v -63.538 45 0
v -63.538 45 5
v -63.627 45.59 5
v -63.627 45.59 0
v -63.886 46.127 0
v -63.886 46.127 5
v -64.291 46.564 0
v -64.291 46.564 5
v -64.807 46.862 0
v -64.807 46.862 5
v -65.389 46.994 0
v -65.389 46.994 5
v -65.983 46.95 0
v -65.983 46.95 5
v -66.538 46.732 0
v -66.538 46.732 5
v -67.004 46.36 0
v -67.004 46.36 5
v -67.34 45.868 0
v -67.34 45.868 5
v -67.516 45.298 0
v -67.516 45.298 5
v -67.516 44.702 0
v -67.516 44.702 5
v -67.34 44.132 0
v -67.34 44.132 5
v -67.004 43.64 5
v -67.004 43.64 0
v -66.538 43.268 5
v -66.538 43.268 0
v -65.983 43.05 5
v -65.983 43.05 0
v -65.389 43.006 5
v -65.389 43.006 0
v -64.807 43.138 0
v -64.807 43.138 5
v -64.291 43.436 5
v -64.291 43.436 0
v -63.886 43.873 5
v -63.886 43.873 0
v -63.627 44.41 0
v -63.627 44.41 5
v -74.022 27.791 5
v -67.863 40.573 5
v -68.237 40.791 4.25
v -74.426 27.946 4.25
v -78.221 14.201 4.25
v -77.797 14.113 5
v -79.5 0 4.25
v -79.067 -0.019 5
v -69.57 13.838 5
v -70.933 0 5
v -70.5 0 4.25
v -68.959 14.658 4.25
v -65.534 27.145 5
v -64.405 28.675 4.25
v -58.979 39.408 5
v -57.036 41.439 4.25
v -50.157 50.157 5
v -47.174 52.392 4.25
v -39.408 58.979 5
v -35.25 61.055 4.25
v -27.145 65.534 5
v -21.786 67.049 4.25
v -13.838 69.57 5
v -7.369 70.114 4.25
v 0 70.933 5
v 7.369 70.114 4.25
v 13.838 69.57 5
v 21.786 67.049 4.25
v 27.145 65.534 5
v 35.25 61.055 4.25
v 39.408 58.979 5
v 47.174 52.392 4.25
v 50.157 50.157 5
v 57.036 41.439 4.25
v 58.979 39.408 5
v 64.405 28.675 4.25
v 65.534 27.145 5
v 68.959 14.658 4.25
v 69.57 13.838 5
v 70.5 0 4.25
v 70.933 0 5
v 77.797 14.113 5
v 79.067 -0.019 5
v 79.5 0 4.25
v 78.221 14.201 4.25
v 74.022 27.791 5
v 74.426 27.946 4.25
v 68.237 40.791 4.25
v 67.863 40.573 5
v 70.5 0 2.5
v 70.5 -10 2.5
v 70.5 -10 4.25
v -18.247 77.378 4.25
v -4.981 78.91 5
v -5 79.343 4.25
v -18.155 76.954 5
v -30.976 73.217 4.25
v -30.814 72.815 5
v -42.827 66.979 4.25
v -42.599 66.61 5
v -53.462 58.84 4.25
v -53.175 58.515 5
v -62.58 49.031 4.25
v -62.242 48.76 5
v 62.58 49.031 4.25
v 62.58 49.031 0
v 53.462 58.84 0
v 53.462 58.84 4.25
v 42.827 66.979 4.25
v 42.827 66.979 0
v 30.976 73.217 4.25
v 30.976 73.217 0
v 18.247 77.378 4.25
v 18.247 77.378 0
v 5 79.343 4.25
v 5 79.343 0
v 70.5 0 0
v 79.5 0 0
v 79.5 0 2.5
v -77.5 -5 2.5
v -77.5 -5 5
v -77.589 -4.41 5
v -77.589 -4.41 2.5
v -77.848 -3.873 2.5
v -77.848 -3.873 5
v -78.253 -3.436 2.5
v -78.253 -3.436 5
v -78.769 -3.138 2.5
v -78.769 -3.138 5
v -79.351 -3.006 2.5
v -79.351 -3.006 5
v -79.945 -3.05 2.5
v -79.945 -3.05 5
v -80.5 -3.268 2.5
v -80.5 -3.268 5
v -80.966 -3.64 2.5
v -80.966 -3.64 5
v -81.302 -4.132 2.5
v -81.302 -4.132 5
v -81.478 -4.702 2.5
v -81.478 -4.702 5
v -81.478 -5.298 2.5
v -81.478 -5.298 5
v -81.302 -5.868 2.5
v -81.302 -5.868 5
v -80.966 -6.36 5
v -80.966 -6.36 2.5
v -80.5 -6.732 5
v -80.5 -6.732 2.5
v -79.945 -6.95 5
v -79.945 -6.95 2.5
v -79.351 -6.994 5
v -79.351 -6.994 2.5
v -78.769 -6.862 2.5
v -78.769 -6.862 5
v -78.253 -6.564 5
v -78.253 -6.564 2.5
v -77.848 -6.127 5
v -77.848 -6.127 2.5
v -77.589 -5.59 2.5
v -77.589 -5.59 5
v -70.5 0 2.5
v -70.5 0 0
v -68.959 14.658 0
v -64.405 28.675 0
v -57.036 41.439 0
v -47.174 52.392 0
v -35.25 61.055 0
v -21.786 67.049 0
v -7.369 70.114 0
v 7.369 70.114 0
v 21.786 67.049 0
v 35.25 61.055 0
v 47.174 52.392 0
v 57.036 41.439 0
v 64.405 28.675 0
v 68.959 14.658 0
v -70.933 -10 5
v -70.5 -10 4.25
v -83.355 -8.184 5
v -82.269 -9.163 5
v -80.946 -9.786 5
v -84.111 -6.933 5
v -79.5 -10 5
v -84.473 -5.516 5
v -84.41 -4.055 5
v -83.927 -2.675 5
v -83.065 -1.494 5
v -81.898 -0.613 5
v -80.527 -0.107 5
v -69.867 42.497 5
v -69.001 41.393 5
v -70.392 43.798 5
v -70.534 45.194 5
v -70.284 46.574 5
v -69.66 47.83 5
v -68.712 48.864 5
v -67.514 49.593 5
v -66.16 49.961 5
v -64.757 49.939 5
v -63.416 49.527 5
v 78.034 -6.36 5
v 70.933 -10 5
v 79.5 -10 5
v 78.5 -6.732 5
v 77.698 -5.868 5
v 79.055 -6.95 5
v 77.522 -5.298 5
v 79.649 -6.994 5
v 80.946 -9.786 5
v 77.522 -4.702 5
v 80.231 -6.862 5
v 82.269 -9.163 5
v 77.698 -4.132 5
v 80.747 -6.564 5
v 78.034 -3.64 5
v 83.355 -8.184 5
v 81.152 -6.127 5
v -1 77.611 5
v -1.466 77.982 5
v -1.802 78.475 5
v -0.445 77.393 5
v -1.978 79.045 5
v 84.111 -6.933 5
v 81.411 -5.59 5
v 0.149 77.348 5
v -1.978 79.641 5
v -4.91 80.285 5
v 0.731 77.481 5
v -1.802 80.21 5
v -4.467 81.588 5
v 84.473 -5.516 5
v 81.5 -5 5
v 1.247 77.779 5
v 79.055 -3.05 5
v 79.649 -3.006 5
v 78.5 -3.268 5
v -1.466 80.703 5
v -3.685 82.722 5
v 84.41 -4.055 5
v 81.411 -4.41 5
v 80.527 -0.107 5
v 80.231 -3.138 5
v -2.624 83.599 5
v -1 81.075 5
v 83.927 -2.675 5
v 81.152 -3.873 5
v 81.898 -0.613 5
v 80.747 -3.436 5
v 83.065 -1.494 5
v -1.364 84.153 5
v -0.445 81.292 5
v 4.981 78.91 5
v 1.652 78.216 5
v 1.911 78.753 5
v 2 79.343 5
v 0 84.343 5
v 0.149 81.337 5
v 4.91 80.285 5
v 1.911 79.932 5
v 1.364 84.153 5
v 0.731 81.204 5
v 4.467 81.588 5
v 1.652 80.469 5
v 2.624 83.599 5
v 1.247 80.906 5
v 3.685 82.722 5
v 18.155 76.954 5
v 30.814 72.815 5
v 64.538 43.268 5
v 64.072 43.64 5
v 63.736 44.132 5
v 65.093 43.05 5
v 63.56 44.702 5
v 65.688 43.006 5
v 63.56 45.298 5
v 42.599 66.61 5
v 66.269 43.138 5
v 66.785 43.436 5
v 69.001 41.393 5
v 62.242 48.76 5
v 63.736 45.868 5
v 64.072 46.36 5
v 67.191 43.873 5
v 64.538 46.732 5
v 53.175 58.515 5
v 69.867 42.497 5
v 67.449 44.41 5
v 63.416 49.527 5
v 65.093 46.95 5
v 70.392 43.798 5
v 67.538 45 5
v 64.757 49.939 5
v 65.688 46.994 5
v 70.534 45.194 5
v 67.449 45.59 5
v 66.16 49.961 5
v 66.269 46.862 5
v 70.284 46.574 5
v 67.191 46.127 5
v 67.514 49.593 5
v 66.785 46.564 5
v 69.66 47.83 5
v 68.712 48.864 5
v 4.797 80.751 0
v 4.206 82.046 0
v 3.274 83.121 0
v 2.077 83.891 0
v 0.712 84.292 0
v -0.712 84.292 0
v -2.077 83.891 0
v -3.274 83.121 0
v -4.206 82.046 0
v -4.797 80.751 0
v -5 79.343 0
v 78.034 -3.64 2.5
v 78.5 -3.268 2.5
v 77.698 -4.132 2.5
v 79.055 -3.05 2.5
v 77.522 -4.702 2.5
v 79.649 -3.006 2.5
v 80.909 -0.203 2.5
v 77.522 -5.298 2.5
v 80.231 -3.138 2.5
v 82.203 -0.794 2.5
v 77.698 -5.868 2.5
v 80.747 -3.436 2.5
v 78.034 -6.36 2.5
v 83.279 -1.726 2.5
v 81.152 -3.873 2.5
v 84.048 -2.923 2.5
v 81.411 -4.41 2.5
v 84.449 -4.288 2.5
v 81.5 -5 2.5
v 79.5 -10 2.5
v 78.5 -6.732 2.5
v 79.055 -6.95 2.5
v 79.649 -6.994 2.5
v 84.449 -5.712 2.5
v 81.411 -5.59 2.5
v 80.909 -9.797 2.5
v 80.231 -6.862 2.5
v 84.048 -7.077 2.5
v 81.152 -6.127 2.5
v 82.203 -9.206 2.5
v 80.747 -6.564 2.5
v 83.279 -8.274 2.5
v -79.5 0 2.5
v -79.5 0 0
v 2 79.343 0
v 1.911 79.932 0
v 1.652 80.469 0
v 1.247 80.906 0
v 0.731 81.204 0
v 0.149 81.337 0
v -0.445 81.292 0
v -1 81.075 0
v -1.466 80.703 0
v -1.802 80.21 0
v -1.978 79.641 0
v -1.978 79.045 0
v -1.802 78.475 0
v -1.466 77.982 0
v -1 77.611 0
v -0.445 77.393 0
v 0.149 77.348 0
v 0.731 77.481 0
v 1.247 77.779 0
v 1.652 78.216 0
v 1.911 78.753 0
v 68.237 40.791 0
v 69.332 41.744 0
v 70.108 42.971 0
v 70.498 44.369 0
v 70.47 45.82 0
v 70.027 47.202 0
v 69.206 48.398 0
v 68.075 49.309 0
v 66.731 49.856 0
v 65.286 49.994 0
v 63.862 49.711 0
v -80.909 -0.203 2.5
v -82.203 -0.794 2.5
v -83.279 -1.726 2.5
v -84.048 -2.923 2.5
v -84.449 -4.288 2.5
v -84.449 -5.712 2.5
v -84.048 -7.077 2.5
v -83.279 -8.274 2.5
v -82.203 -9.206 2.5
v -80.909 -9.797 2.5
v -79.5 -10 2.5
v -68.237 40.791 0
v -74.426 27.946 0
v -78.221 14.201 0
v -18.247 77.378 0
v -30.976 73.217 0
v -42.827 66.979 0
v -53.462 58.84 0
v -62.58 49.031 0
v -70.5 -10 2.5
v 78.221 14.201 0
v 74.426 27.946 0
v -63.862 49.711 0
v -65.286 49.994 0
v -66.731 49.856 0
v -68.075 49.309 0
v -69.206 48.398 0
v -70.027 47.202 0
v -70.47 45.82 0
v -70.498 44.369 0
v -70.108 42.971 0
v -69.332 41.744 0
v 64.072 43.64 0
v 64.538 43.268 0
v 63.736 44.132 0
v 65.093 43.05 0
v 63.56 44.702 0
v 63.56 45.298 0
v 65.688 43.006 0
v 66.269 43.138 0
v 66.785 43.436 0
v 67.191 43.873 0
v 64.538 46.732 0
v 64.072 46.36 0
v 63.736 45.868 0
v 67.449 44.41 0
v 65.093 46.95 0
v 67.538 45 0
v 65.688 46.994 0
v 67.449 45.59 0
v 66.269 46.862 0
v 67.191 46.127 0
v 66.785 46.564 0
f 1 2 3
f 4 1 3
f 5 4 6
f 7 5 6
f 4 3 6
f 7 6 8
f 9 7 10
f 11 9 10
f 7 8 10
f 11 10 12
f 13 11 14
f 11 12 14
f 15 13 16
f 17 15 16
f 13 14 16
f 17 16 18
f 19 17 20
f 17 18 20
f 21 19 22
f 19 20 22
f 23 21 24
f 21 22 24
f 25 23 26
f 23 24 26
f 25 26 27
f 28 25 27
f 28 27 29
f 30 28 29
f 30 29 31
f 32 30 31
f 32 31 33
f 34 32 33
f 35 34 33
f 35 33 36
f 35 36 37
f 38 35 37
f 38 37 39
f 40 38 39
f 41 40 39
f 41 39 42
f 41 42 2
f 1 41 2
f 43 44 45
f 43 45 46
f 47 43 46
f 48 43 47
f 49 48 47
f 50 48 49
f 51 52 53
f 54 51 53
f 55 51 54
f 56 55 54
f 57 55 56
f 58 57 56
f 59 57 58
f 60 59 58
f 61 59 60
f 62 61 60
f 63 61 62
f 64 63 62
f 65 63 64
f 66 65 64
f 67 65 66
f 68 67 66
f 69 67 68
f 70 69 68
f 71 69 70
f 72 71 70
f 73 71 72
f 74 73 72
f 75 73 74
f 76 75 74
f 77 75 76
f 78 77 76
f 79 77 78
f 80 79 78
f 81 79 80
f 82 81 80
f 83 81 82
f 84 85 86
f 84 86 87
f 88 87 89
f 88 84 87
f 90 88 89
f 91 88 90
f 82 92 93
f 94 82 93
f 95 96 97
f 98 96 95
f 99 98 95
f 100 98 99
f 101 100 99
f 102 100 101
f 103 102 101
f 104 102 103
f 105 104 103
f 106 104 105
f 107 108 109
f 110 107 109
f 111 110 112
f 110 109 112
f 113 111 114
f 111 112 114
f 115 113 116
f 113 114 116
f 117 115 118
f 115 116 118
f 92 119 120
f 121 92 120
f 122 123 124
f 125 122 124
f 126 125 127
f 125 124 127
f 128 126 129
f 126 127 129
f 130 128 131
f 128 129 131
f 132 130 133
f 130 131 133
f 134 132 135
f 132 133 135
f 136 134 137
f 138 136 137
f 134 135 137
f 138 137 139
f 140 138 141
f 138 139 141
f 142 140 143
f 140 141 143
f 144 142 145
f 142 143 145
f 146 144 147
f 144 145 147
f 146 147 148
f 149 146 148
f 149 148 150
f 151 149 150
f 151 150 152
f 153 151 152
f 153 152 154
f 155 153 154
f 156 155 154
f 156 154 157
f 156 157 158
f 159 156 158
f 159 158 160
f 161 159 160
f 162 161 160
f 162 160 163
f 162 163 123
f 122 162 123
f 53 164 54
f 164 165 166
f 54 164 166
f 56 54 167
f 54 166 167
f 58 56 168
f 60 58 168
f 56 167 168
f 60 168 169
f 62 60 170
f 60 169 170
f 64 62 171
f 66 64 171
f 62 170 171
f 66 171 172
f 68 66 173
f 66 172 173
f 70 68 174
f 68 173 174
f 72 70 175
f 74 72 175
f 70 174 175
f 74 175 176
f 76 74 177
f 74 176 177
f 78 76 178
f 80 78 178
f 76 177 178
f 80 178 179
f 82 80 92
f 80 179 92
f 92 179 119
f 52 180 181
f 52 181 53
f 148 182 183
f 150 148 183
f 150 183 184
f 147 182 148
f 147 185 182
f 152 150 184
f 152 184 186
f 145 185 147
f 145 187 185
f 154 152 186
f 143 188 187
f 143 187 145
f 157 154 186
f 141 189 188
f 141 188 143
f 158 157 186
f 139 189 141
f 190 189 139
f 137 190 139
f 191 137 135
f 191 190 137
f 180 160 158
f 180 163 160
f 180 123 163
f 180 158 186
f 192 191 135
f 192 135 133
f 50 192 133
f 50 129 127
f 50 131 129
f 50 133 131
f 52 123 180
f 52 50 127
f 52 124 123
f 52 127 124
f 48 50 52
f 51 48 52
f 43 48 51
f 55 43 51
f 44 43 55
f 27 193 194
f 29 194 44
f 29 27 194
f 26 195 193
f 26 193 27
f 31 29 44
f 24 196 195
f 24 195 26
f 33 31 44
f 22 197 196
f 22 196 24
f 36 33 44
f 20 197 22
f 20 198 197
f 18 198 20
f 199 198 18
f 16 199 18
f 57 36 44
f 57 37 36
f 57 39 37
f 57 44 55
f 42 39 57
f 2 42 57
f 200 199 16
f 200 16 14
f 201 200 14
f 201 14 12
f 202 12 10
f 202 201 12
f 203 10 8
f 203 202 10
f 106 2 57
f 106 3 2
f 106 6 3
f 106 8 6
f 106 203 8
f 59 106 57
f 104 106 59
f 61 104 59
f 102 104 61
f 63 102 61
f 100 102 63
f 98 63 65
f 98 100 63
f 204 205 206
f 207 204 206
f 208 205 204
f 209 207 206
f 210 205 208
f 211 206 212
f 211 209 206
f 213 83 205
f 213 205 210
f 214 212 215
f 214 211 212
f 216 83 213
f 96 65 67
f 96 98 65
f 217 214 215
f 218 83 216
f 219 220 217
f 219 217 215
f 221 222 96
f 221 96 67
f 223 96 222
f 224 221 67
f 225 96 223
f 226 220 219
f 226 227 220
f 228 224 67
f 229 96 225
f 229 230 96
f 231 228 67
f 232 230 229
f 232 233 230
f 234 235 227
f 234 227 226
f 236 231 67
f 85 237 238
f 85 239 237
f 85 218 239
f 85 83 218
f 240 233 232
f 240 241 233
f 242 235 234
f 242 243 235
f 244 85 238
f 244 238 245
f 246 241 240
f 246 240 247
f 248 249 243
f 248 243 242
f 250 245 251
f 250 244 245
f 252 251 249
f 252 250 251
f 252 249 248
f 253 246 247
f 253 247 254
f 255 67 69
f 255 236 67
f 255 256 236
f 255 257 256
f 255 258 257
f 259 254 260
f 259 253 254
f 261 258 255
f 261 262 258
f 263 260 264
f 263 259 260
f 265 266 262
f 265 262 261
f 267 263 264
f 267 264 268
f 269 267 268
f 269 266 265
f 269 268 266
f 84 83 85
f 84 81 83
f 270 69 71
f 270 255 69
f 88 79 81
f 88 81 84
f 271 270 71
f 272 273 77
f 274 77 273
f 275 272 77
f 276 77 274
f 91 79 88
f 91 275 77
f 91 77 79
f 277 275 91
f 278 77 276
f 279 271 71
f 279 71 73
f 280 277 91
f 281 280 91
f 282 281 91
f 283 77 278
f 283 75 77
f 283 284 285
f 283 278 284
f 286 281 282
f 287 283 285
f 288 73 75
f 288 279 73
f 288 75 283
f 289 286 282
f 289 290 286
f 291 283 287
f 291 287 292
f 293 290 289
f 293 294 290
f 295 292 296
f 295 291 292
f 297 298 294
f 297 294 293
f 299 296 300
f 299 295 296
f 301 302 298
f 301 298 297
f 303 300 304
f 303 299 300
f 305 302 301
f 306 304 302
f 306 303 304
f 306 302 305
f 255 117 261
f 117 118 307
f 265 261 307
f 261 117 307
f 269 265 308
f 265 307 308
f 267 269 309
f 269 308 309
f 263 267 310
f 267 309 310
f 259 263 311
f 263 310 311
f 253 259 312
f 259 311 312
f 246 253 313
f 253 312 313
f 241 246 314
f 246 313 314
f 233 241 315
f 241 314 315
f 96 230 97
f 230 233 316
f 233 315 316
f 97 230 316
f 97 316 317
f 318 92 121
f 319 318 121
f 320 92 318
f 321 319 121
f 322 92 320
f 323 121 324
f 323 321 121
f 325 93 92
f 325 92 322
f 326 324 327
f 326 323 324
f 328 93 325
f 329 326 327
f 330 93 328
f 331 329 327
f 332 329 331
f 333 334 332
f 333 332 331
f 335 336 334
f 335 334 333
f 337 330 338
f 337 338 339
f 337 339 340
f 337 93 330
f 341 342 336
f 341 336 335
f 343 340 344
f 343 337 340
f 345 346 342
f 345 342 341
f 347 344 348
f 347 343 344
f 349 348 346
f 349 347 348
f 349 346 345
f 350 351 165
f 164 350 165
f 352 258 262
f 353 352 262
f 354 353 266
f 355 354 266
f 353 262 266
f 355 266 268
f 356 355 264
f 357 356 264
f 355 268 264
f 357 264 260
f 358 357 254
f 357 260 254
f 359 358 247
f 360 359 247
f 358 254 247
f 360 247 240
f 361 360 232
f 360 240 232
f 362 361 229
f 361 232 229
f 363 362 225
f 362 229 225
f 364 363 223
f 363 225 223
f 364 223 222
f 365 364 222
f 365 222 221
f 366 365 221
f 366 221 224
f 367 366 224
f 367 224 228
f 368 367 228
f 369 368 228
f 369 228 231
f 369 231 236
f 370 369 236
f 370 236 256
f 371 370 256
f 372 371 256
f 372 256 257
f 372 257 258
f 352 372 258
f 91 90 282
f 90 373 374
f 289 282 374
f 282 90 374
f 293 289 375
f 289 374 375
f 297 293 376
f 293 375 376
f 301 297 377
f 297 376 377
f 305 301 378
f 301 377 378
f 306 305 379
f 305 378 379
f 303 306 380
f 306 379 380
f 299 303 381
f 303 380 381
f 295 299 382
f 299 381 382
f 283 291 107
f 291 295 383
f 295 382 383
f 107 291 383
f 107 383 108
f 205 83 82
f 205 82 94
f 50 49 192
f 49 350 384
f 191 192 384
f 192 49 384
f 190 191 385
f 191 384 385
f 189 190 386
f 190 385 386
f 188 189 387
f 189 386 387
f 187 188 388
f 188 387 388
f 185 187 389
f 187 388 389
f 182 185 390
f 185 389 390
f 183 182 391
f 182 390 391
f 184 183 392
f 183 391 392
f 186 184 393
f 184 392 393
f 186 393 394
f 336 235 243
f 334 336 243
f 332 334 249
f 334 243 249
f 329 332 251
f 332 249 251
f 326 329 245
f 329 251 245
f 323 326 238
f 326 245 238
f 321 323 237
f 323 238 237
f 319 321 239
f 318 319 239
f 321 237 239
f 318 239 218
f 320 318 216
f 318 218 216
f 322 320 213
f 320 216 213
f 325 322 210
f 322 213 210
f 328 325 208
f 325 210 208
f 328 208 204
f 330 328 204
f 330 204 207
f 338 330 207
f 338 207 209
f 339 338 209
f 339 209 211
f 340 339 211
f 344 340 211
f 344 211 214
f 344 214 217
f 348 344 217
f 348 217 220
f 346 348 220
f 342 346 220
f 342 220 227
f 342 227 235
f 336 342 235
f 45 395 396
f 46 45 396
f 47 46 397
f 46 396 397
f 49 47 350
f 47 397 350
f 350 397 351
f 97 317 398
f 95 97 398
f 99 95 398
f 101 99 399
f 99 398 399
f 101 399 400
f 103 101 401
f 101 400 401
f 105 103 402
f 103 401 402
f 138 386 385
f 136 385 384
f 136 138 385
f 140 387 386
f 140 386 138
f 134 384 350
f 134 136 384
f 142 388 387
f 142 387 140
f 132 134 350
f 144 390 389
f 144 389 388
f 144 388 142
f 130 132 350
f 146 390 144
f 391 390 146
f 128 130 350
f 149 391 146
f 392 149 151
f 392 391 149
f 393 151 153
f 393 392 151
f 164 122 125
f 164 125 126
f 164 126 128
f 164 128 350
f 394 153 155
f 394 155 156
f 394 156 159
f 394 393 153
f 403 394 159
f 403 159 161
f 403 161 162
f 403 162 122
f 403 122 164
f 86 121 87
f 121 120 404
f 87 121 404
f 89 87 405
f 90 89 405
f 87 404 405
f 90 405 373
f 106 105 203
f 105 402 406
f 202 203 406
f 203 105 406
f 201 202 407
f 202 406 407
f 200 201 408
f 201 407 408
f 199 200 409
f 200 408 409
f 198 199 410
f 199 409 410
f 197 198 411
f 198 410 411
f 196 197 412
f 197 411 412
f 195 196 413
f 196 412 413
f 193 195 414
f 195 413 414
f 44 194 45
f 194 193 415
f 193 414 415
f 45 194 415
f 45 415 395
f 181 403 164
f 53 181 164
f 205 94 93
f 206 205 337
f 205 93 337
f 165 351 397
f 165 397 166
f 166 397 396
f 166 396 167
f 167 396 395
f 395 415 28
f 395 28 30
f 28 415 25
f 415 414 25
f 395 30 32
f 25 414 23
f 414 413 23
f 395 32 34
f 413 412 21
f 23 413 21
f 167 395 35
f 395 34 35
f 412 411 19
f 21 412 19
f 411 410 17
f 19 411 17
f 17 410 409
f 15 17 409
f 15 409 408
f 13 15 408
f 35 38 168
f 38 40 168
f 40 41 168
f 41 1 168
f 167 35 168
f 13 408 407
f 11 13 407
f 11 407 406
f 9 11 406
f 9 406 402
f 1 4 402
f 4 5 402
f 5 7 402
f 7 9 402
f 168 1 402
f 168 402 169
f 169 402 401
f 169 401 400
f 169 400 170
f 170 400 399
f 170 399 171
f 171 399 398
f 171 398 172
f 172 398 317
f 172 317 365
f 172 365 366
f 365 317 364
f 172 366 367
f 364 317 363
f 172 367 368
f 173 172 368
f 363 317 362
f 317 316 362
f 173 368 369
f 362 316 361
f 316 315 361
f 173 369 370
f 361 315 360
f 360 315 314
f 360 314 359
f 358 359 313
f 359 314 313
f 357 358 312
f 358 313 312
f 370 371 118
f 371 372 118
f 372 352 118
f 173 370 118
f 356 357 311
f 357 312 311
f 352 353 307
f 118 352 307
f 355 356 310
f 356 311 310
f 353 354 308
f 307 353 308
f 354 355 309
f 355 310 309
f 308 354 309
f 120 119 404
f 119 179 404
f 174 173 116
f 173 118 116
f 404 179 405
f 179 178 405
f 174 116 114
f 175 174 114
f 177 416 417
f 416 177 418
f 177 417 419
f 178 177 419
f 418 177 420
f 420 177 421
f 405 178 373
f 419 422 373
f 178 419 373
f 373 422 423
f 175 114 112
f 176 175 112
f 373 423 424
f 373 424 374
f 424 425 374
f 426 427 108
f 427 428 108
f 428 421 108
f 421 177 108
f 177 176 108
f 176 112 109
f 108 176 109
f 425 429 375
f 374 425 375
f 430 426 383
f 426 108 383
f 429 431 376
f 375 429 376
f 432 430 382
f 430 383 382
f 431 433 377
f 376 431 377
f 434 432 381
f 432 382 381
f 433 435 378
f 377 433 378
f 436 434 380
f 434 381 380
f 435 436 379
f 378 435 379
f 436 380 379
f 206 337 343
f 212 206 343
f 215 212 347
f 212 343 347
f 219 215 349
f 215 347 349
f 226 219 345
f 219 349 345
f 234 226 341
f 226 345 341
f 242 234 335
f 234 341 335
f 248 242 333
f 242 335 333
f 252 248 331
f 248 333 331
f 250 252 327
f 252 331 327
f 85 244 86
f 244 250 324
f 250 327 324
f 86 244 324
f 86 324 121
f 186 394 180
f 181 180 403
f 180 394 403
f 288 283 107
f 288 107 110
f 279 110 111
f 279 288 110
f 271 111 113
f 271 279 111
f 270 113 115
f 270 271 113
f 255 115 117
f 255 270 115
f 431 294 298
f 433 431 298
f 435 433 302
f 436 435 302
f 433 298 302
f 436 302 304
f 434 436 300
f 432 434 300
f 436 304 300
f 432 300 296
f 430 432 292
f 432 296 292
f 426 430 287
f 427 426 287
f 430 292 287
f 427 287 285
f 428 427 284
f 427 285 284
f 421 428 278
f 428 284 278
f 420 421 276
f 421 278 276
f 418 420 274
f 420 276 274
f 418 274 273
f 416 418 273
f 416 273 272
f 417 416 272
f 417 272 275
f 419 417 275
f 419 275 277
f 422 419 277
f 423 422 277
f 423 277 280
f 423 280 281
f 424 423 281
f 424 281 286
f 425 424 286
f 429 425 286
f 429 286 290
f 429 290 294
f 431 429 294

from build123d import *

# Parameters (mm, degrees)
F1_DEPTH   = 5
F2_R       = 2
F3_DEPTH   = 25
F4_SIZE2   = 0.4330127019
F4_SIZE    = 0.75
F4_2_SIZE2 = 0.4330127019
F4_2_SIZE  = 0.75
F4_3_SIZE2 = 0.4330127019
F4_3_SIZE  = 0.75
F4_4_SIZE2 = 0.4330127019
F4_4_SIZE  = 0.75
F4_5_SIZE2 = 0.4330127019
F4_5_SIZE  = 0.75
F6_DEPTH   = 2.5


with BuildPart() as f1:
    # F0 (on Top) → F1 (new body)
    with BuildSketch(Plane.XY):
        with BuildLine():
            Line((79.5, -10), (79.5, 0))
            ThreePointArc((79.5, 0), (76.6326218032, 21.1587163024), (68.2373264008, 40.7911422452))
            ThreePointArc((68.2373264008, 40.7911422452), (65.5381568249, 45), (62.5797484655, 49.0308584668))
            ThreePointArc((62.5797484655, 49.0308584668), (37.0331769321, 70.3476638298), (5, 79.3426115023))
            ThreePointArc((5, 79.3426115023), (0, 79.5), (-5, 79.3426115023))
            ThreePointArc((-5, 79.3426115023), (-37.0331769321, 70.3476638298), (-62.5797484655, 49.0308584668))
            ThreePointArc((-62.5797484655, 49.0308584668), (-65.5381568249, 45), (-68.2373264008, 40.7911422452))
            ThreePointArc((-68.2373264008, 40.7911422452), (-76.6326218032, 21.1587163024), (-79.5, 0))
            Line((-79.5, 0), (-79.5, -10))
            Line((-79.5, -10), (-70.5, -10))
            Line((-70.5, -10), (-70.5, 0))
            ThreePointArc((-70.5, 0), (0, 70.5), (70.5, 0))
            Line((70.5, 0), (70.5, -10))
            Line((70.5, -10), (79.5, -10))
        make_face()
        with BuildLine():
            ThreePointArc((79.5, -10), (84.5, -5), (79.5, 0))
            Line((79.5, 0), (79.5, -10))
        make_face()
        with BuildLine():
            ThreePointArc((62.5797484655, 49.0308584668), (65.5381568249, 45), (68.2373264008, 40.7911422452))
            ThreePointArc((68.2373264008, 40.7911422452), (69.6600534805, 47.8301886792), (62.5797484655, 49.0308584668))
        make_face()
        with BuildLine():
            ThreePointArc((-5, 79.3426115023), (0, 79.5), (5, 79.3426115023))
            ThreePointArc((5, 79.3426115023), (0, 84.3426115023), (-5, 79.3426115023))
        make_face()
        with BuildLine():
            ThreePointArc((-68.2373264008, 40.7911422452), (-65.5381568249, 45), (-62.5797484655, 49.0308584668))
            ThreePointArc((-62.5797484655, 49.0308584668), (-69.6600534805, 47.8301886792), (-68.2373264008, 40.7911422452))
        make_face()
        with BuildLine():
            ThreePointArc((-79.5, 0), (-84.5, -5), (-79.5, -10))
            Line((-79.5, -10), (-79.5, 0))
        make_face()
    extrude(amount=F1_DEPTH)

    # F2 (on face) → F3 (cut)
    with BuildSketch(Plane.XY.offset(5)):
        with Locations((0, 79.3426115023)):
            Circle(F2_R)
        with Locations((-65.5381568249, 45)):
            Circle(F2_R)
        with Locations((65.5381568249, 45)):
            Circle(F2_R)
        with Locations((-79.5, -5)):
            Circle(F2_R)
        with Locations((79.5, -5)):
            Circle(F2_R)
    extrude(amount=-F3_DEPTH, mode=Mode.SUBTRACT)

    # F4
    f4_edges = [f1.edges().sort_by_distance(p)[0] for p in [
        (0, 70.5, 5),
    ]]
    f4_side = f1.faces().sort_by_distance((0, 70.5, 2.5))[0]
    chamfer(f4_edges, length=F4_SIZE, length2=F4_SIZE2, reference=f4_side)

    # F4#2
    f4_2_edges = [f1.edges().sort_by_distance(p)[0] for p in [
        (-37.033177, 70.347664, 5),
    ]]
    f4_2_side = f1.faces().sort_by_distance((-37.033177, 70.347664, 2.5))[0]
    chamfer(f4_2_edges, length=F4_2_SIZE, length2=F4_2_SIZE2, reference=f4_2_side)

    # F4#3
    f4_3_edges = [f1.edges().sort_by_distance(p)[0] for p in [
        (37.033177, 70.347664, 5),
    ]]
    f4_3_side = f1.faces().sort_by_distance((37.033177, 70.347664, 2.5))[0]
    chamfer(f4_3_edges, length=F4_3_SIZE, length2=F4_3_SIZE2, reference=f4_3_side)

    # F4#4
    f4_4_edges = [f1.edges().sort_by_distance(p)[0] for p in [
        (76.632622, 21.158716, 5),
    ]]
    f4_4_side = f1.faces().sort_by_distance((76.632622, 21.158716, 2.5))[0]
    chamfer(f4_4_edges, length=F4_4_SIZE, length2=F4_4_SIZE2, reference=f4_4_side)

    # F4#5
    f4_5_edges = [f1.edges().sort_by_distance(p)[0] for p in [
        (-76.632622, 21.158716, 5),
    ]]
    f4_5_side = f1.faces().sort_by_distance((-76.632622, 21.158716, 2.5))[0]
    chamfer(f4_5_edges, length=F4_5_SIZE, length2=F4_5_SIZE2, reference=f4_5_side)

    # F5 (on face) → F6 (cut)
    with BuildSketch(Plane(origin=(0, 0, 0), x_dir=(1, 0, 0), z_dir=(0, 0, -1))):
        with BuildLine():
            ThreePointArc((-79.5, 10), (-84.5, 5), (-79.5, 0))
            Line((-79.5, 0), (-70.5, 0))
            Line((-70.5, 0), (-70.5, 10))
            Line((-70.5, 10), (-79.5, 10))
        make_face()
        with BuildLine():
            Line((70.5, 0), (79.5, 0))
            ThreePointArc((79.5, 0), (84.5, 5), (79.5, 10))
            Line((79.5, 10), (70.5, 10))
            Line((70.5, 10), (70.5, 0))
        make_face()
    extrude(amount=-F6_DEPTH, mode=Mode.SUBTRACT)


solid = f1.part
